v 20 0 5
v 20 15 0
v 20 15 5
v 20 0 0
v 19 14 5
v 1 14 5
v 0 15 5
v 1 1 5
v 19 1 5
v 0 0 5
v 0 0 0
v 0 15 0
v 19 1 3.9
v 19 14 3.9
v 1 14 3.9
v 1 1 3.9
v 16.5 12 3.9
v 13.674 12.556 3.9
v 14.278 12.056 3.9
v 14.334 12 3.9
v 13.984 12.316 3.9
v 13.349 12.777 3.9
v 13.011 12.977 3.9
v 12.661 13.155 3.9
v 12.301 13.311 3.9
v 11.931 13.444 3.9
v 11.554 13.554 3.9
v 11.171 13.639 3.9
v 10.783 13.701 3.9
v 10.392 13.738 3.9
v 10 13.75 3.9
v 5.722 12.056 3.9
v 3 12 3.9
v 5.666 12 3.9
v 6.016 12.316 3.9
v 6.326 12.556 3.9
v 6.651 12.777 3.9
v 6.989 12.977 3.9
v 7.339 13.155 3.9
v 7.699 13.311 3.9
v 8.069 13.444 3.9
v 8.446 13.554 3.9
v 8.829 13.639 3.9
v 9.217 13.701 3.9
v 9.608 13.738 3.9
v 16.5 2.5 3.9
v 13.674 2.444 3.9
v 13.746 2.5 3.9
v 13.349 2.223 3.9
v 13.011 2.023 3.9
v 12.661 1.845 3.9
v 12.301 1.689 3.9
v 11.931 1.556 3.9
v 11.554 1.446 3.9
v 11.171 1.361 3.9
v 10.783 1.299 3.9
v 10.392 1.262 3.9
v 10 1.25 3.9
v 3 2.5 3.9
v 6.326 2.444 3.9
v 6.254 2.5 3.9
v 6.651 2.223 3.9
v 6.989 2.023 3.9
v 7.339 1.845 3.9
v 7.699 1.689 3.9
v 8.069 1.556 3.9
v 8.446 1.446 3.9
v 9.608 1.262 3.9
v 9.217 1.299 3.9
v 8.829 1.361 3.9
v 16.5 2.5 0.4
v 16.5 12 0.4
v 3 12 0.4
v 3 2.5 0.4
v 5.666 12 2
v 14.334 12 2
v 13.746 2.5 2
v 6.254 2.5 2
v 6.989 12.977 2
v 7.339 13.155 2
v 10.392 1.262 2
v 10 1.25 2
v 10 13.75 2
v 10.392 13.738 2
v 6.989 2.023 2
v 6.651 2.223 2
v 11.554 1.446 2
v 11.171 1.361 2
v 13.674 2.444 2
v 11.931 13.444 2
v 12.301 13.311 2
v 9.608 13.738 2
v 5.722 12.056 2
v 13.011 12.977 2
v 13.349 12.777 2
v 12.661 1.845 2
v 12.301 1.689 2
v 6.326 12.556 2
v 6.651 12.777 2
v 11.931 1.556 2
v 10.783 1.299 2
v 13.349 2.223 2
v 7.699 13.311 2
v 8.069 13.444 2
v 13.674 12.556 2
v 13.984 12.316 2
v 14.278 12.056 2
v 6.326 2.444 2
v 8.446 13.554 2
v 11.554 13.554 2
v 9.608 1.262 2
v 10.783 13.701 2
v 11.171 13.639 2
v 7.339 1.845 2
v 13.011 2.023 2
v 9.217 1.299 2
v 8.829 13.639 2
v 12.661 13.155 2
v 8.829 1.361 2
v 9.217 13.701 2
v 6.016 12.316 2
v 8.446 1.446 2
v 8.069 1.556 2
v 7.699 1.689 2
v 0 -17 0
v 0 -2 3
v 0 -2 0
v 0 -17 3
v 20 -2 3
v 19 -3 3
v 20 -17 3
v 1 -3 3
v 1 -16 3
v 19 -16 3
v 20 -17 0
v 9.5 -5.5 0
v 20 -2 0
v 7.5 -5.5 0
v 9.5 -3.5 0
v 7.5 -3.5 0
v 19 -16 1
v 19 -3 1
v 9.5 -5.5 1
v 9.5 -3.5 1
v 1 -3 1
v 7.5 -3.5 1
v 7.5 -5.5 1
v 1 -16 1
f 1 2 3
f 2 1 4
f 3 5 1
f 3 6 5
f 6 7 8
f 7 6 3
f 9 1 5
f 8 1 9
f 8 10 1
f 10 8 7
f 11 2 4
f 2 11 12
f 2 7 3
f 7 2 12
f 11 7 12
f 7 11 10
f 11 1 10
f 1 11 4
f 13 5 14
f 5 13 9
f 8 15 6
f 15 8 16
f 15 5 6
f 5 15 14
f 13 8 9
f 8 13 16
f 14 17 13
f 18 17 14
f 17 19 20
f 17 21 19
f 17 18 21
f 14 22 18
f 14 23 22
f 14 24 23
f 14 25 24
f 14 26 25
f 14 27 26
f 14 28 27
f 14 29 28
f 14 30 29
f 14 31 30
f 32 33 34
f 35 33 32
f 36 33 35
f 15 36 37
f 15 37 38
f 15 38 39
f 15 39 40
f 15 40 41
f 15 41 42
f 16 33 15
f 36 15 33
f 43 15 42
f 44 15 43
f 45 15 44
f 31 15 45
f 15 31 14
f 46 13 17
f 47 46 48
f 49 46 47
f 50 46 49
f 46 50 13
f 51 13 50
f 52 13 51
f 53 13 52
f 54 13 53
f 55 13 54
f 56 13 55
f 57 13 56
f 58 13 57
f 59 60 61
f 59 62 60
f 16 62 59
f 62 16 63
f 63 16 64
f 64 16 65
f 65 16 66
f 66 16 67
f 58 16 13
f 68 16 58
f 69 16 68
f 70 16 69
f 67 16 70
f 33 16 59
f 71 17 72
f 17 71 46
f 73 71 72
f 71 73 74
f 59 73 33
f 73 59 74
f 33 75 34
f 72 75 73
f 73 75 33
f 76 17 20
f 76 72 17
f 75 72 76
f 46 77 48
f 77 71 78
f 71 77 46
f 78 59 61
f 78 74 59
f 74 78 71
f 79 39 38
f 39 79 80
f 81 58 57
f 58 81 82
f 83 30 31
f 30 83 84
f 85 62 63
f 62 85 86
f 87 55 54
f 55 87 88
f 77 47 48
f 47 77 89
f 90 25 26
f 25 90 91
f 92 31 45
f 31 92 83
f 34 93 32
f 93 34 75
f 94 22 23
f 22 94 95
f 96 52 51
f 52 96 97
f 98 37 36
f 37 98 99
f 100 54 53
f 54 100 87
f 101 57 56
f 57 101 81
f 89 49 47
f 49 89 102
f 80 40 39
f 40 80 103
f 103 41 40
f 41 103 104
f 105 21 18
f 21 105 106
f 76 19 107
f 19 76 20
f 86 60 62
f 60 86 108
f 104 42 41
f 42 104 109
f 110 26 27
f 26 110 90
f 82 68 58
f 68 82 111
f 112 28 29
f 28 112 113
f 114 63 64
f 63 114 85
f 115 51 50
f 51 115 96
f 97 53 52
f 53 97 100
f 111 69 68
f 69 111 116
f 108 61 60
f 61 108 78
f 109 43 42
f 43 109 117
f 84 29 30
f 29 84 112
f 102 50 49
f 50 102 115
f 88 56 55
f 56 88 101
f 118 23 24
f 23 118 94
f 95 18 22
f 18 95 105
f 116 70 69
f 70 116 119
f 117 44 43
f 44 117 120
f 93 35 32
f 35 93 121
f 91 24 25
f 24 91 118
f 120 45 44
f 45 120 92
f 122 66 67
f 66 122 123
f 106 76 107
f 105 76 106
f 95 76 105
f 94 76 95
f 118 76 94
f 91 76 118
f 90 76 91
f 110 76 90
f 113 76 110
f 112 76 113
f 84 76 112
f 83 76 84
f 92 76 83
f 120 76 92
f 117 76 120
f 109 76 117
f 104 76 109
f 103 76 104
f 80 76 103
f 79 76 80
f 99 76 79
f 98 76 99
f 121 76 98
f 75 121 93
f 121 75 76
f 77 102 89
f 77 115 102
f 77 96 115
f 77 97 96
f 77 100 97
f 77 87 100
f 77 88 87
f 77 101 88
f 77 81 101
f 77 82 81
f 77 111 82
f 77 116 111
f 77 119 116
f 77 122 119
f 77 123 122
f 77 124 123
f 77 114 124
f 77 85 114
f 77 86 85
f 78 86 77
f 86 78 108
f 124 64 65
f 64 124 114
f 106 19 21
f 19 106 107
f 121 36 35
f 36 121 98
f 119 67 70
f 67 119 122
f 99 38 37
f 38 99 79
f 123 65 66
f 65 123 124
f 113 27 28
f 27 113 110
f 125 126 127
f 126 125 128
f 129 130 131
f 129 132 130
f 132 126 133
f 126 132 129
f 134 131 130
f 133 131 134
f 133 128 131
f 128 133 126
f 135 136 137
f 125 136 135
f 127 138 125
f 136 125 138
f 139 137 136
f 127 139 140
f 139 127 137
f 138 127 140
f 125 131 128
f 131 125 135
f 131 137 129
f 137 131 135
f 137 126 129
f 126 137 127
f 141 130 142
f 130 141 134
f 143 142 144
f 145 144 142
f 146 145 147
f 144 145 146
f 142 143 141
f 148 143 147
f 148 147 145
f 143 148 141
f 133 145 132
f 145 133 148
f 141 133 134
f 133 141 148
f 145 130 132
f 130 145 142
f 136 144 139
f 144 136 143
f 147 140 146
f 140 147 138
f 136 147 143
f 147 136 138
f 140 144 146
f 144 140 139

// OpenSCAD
// file: components/Coin_Cell_1220.scad
//1220 Coin Cell Battery
//http://www.farnell.com/datasheets/1496882.pdf

detail = 20;
Coin_Cell_1220_diameter = 12.5;
Coin_Cell_1220_radius = Coin_Cell_1220_diameter / 2;
Coin_Cell_1220_height = 2;

//Coin_Cell_1220();

module Coin_Cell_1220(x, y, z) {
    translate([x, y, z])
    cylinder(h=Coin_Cell_1220_height, r=Coin_Cell_1220_radius, $fn=detail);
}
// file: components/BAT_HLD.scad
//BAT-HLD-012-SMT-OTL
//https://www.mouser.se/datasheet/2/238/BAT-HLD-012-SMT%20Diagram-1175215.pdf
BAT_HLD_x = 13.5;
BAT_HLD_y = 9.5;
BAT_HLD_z = 3.6;


//BAT_HLD();

module BAT_HLD(x, y, z, centering) {
    translate([x, y, z])
    cube([BAT_HLD_x, BAT_HLD_y, BAT_HLD_z], centering);
}
// file: components/DST1610A.scad
//https://datasheet.lcsc.com/szlcsc/KDS-Daishinku-KDS-32-768KHz-12-5PF-20ppm_C93231.pdf

DST1610A_x = 1;
DST1610A_y = 1.6;
DST1610A_z = 0.45;

//DST1610A();

module DST1610A(x, y, z, centering) {
    translate([x, y, z])
    cube([DST1610A_x, DST1610A_y, DST1610A_z], centering);
}
// file: components/ADP150.scad
//https://datasheet.lcsc.com/szlcsc/Analog-Devices-ADI-ADP150ACBZ-3-3-R7_C136038.pdf

ADP150_x = 0.76;
ADP150_y = 0.76;
ADP150_z = 0.4;

//ADP150();
module ADP150(x, y, z, centering) {
    translate([x, y, z])
    cube([ADP150_x, ADP150_y, ADP150_z], centering);
}
// file: components/SMD_Components.scad
//_0804();
//_0603();
//_0402();




module _0804(x, y, z, centering) {
    translate([x, y, z])
    cube([2.0, 1.0, 1.0],centering);
}

module _0603(x, y, z, centering) {
    translate([x, y, z])
    cube([1.6, 0.8, 0.8],centering);
}

module _0402(x, y, z, centering) {
    translate([x, y, z])
    cube([1.0, 0.5, 0.5],centering);
}

module _0201(x, y, z, centering) {
    translate([x, y, z])
    cube([0.6, 0.3, 0.3],centering);
}
// file: components/female_header.scad
hole_diameter = 0.88;
hole_spacing = 2.5;
//female_header_4(1,1,1);


module female_header_1(x, y, z, centering) {
    translate([x, y, z]) {
        translate([1.27,1.27,0])
        cylinder(h = 10, r = hole_diameter / 2, center = true, $fn=10);
    }
}


module female_header_2(x, y, z, centering) {
    translate([x, y, z]) {
        translate([1.27,1.27,0])
            cylinder(h = 10, r = hole_diameter / 2, center = true, $fn=10);
        translate([1.27, 1 * hole_spacing + 1.27,0])
            cylinder(h = 10, r = hole_diameter / 2, center = true, $fn=10);
    }
}


module female_header_3(x, y, z, centering) {
    translate([x, y, z]) {
        translate([1.27,1.27,0])
            cylinder(h = 10, r = hole_diameter / 2, center = true, $fn=10);
        translate([1.27, 1 * hole_spacing + 1.27,0])
            cylinder(h = 10, r = hole_diameter / 2, center = true, $fn=10);
        translate([1.27, 2 * hole_spacing + 1.27,0])
            cylinder(h = 10, r = hole_diameter / 2, center = true, $fn=10);
    }
}


module female_header_4(x, y, z, centering) {
    translate([x, y, z]) {
        translate([1.27,1.27,0])
            cylinder(h = 10, r = hole_diameter / 2, center = true, $fn=10);
        translate([1.27, 1 * hole_spacing + 1.27,0])
            cylinder(h = 10, r = hole_diameter / 2, center = true, $fn=10);
        translate([1.27, 2 * hole_spacing + 1.27,0])
            cylinder(h = 10, r = hole_diameter / 2, center = true, $fn=10);
        translate([1.27, 3 * hole_spacing + 1.27,0])
            cylinder(h = 10, r = hole_diameter / 2, center = true, $fn=10);
    }
}

module female_header_7(x, y, z, centering) {
    translate([x, y, z]) {
        translate([1.27,1.27,0])
            cylinder(h = 10, r = hole_diameter / 2, center = true, $fn=10);
        translate([1.27, 1 * hole_spacing + 1.27,0])
            cylinder(h = 10, r = hole_diameter / 2, center = true, $fn=10);
        translate([1.27, 2 * hole_spacing + 1.27,0])
            cylinder(h = 10, r = hole_diameter / 2, center = true, $fn=10);
        translate([1.27, 3 * hole_spacing + 1.27,0])
            cylinder(h = 10, r = hole_diameter / 2, center = true, $fn=10);
        translate([1.27, 4 * hole_spacing + 1.27,0])
            cylinder(h = 10, r = hole_diameter / 2, center = true, $fn=10);
        translate([1.27, 5 * hole_spacing + 1.27,0])
            cylinder(h = 10, r = hole_diameter / 2, center = true, $fn=10);
        translate([1.27, 6 * hole_spacing + 1.27,0])
            cylinder(h = 10, r = hole_diameter / 2, center = true, $fn=10);
    }
}
// file: components/TP4056.scad
//https://datasheet.lcsc.com/szlcsc/Nanjing-Extension-Microelectronics-TP4056_C16581.pdf

TP4056_x = 3.9;
TP4056_y = 4.9;
TP4056_z = 1.55;

TP4056_pin_x = 6;
TP4056_pin_y = 0.4;
TP4056_pin_z = 0.2;
TP4056_pin_spacing = 1.27;
TP4056_pin_offset = 0.4;

//TP4056();

module TP4056(x, y, z, centering) {
    translate([x, y, z]) {
        if(centering) {
            total_x = TP4056_x;
            total_y = TP4056_y;
            total_z = TP4056_z;
            translate([ -total_x / 2, -total_y / 2, -total_z / 2])
            TP4056_component();
        } else {
            TP4056_component();
        }
    }
}


module TP4056_component() {
    union() {
        //pins
        translate([0, 0 * TP4056_pin_spacing + TP4056_pin_offset, 0])
        cube([TP4056_pin_x, TP4056_pin_y, TP4056_pin_z]);
        translate([0, 1 * TP4056_pin_spacing + TP4056_pin_offset, 0])
        cube([TP4056_pin_x, TP4056_pin_y, TP4056_pin_z]);
        translate([0, 2 * TP4056_pin_spacing + TP4056_pin_offset, 0])
        cube([TP4056_pin_x, TP4056_pin_y, TP4056_pin_z]);
        translate([0, 3 * TP4056_pin_spacing + TP4056_pin_offset, 0])
        cube([TP4056_pin_x, TP4056_pin_y, TP4056_pin_z]);
        //base
        translate([(TP4056_pin_x - TP4056_x) / 2, 0, 0])
        cube([TP4056_x, TP4056_y, TP4056_z]);
    }
}
// file: components/3_3V_Regulator.scad
//https://datasheet.lcsc.com/szlcsc/Texas-Instruments-TI-TPS76933DBVR-PB-FREE_C7101.pdf
reg_x = 1.6;
reg_y = 2.9;
reg_z = 1.45;

reg_pin_x = 2.8;
reg_pin_y = 0.4;
reg_pin_z = 0.1;
reg_pin_spacing = 0.8;
reg_pin_offset = (reg_y - 3 * reg_pin_y) / 4;

//3_3V_Regulator();

module 3_3V_Regulator(x, y, z, centering) {
    translate([x, y, z]) {
        if(centering) {
        total_x = reg_pin_x;
        total_y = reg_y;
        total_z = reg_z + reg_pin_z;
        translate([-total_x/2, -total_y/2, -total_z/2])
        3_3V_Regulator_Component();
        } else {
            3_3V_Regulator_Component();
        }
    }
}

module 3_3V_Regulator_Component() {
    union() {
        //base
        translate([reg_pin_x / 2 - reg_x / 2, 0, reg_pin_z])
        cube([reg_x, reg_y, reg_z]);
        //pins
        translate([0, 0 * reg_pin_spacing + reg_pin_offset, 0])
        cube([reg_pin_x, reg_pin_y, reg_pin_z]);
        translate([0, 1 * reg_pin_spacing + reg_pin_offset, 0])
        cube([reg_pin_x, reg_pin_y, reg_pin_z]);
        translate([0, 2 * reg_pin_spacing + reg_pin_offset, 0])
        cube([reg_pin_x, reg_pin_y, reg_pin_z]);
    }
}
// file: components/mpu9250.scad
//http://www.invensense.com/wp-content/uploads/2015/02/PS-MPU-9250A-01-v1.1.pdf

mpu9250_x = 3;
mpu9250_y = 3;
mpu9250_z = 1;

//mpu9250();

module mpu9250(x, y, z, centering) {
    translate([x, y, z])
    cube([mpu9250_x, mpu9250_y, mpu9250_z], centering);
}
// file: components/microUSB.scad
//https://datasheet.lcsc.com/szlcsc/Jing-Extension-of-the-Electronic-Co-LCSC-MICRO-USB-5S-B-Type-horns-High-temperature_C10418.pdf
microUSB_x = 8;
microUSB_y = 5.74;
microUSB_z = 3;


//microUSB();

module microUSB(x, y, z, centering) {
    translate([x, y, z])
    cube([microUSB_x, microUSB_y, microUSB_z], centering);
}
// file: components/K3-2235S-K1.scad
//https://datasheet.lcsc.com/szlcsc/Korean-Hroparts-Elec-K3-2235S-K1_C145845.pdf

switch_base_x = 3.5;
switch_base_y = 9.1;
switch_base_z = 3.5;

switch_toggle_x = 1.5;
switch_toggle_y = 1.5;
switch_toggle_z = 2;
switch_toggle_travel = 2;

switch_pin_x = 6.9;
switch_pin_y = 0.6;
switch_pin_z = 0.3;
switch_pin_spacing = 2.5;
switch_pin_offset = (switch_base_y - 3 * switch_pin_y) / 4;

//switch();


module switch(x, y, z, centering) {
    translate([x, y, z]) {
        if(centering) {
            total_x = switch_pin_x;
            total_y = switch_base_y;
            total_z = switch_base_z + switch_toggle_z + switch_pin_z;
            translate([ -total_x / 2, -total_y / 2, -total_z / 2])
            switch_component();
        } else {
            switch_component();
        }
    }
}



module switch_component() {
    union() {
        //base
        translate([switch_pin_x / 2 - switch_base_x / 2, 0, switch_pin_z])
        cube([switch_base_x, switch_base_y, switch_base_z]);
        //pins
        translate([0, 0 * switch_pin_spacing + switch_pin_offset, 0])
        cube([switch_pin_x, switch_pin_y, switch_pin_z]);
        translate([0, 1 * switch_pin_spacing + switch_pin_offset, 0])
        cube([switch_pin_x, switch_pin_y, switch_pin_z]);
        translate([0, 2 * switch_pin_spacing + switch_pin_offset, 0])
        cube([switch_pin_x, switch_pin_y, switch_pin_z]);
        //toggle
        translate([(switch_pin_x - switch_toggle_x) / 2, (switch_base_y - (switch_toggle_y + switch_toggle_travel)) / 2, switch_pin_z + switch_base_z])
        cube([switch_toggle_x, switch_toggle_y + switch_toggle_travel, switch_toggle_z]);
    }
}
// file: components/BC832.scad
//https://www.mouser.com/datasheet/2/915/BlueNor_BC832_datasheets-1360471.pdf
BC832_x = 7.8;
BC832_y = 8.8;
BC832_z = 1.5;

//BC832(0,0,0);

module BC832(x, y, z, centering) {
    translate([x, y, z])
    cube([BC832_x,BC832_y,BC832_z], centering);
}
// main file
include <components/BC832.scad>
include <components/K3-2235S-K1.scad>
include <components/microUSB.scad>
include <components/mpu9250.scad>
include <components/3_3V_Regulator.scad>
include <components/TP4056.scad>
include <components/female_header.scad>
include <components/SMD_Components.scad>
include <components/ADP150.scad>
include <components/DST1610A.scad>
include <components/BAT_HLD.scad>
include <components/Coin_Cell_1220.scad>

detail = 100;

SLEEK_Coin_PCB_x = 18;
SLEEK_Coin_PCB_y = 13;
SLEEK_Coin_PCB_z = 0.6;

translate([0,0,5])
difference() {
SLEEK_Capsule(5, 0);
translate([1,1,-0.5])   //extra depth added, just in case
SLEEK_Coin();
}

translate([0,0,3])
rotate([180,0,0])
translate([0,2,0])
SLEEK_Capsule_Top(3,0);




module SLEEK_Capsule(height, rounding) {
    rounded_box(height,rounding);
}

module SLEEK_Capsule_Top(height, rounding) {
    difference() {
    rotate([0,180,0])
    translate([-20,0,0])
    rounded_box(height,rounding);
    translate([1,1,-1])
    cube([SLEEK_Coin_PCB_x, SLEEK_Coin_PCB_y, 3]);  //FILLING
    translate([7.5,1.5,0])
    cube([2, 2, 10]);   //RGB LED
    }
    
}

module rounded_box(z,rounding) {
    translate([-0.5,1.5,-z]) 
    intersection() {
        union() {
            spade(18.5,12.5,z,rounding);
            rotate([0,0,180])
            translate([-SLEEK_Coin_PCB_x-3,-12,0])
            spade(18.5,12.5,z,rounding);
        }
        union() {
            rotate([0,0,90])
            translate([-2,-14,0])
            spade(13.5,12.5,z,rounding);
            rotate([0,0,270])
            translate([-14,7,0])
            spade(13.5,12.5,z,rounding);
        }
    }
}

module SLEEK_Coin(x, y, z, centering) {
    translate([x, y, z])
    SLEEK_Coin_components();
}

module SLEEK_Coin_components() {
    difference() {
        union() {
            PCB();
            translate([0,0,SLEEK_Coin_PCB_z]) {
                translate([0,0,-0.1])
                BC832(2.5,4,0);
                translate([0,0,-0.1])
                mpu9250(12,7,0);
                translate([6.5,1,0])
                translate([0,0,-0.1])
                cube([1.6,1.6,0.5]);  //RGB LED
                translate([0,0,0.1])
                BAT_HLD(2,1.5,-SLEEK_Coin_PCB_z*2 - BAT_HLD_z);
                translate([0,0,0.1])
                Coin_Cell_1220(SLEEK_Coin_PCB_x / 2, SLEEK_Coin_PCB_y / 2, - SLEEK_Coin_PCB_z * 2 - Coin_Cell_1220_height);
                
            }
        }
        /*
        translate([2.5,5.5,0])
        female_header_3(-hole_spacing, 0, 0);
        translate([18,10.5,0])
        female_header_1(-hole_spacing, 0, 0);
        */
    }
}


module PCB() {
    cube([SLEEK_Coin_PCB_x, SLEEK_Coin_PCB_y, SLEEK_Coin_PCB_z]);
    translate([0,0,-SLEEK_Coin_PCB_z])
    cube([SLEEK_Coin_PCB_x, SLEEK_Coin_PCB_y, SLEEK_Coin_PCB_z]);
}

module spade(x, y, z, rounding) {
    diameter = min(y, z, rounding);
    //translate([- x / 2 - 1, 0, 0]) {
    translate([ 0 , 1, 0]) {
        translate([0,-1,0])
        cube([x + 2, y + 1 - diameter / 2, z]);
        translate([0,0,diameter / 2])
        cube([x + 2, y, z - diameter / 2]);
        translate([0, y - diameter / 2, diameter / 2])rotate([0,90,0])cylinder(x + 2, diameter / 2, diameter / 2, false, $fn=detail);
    }
}
